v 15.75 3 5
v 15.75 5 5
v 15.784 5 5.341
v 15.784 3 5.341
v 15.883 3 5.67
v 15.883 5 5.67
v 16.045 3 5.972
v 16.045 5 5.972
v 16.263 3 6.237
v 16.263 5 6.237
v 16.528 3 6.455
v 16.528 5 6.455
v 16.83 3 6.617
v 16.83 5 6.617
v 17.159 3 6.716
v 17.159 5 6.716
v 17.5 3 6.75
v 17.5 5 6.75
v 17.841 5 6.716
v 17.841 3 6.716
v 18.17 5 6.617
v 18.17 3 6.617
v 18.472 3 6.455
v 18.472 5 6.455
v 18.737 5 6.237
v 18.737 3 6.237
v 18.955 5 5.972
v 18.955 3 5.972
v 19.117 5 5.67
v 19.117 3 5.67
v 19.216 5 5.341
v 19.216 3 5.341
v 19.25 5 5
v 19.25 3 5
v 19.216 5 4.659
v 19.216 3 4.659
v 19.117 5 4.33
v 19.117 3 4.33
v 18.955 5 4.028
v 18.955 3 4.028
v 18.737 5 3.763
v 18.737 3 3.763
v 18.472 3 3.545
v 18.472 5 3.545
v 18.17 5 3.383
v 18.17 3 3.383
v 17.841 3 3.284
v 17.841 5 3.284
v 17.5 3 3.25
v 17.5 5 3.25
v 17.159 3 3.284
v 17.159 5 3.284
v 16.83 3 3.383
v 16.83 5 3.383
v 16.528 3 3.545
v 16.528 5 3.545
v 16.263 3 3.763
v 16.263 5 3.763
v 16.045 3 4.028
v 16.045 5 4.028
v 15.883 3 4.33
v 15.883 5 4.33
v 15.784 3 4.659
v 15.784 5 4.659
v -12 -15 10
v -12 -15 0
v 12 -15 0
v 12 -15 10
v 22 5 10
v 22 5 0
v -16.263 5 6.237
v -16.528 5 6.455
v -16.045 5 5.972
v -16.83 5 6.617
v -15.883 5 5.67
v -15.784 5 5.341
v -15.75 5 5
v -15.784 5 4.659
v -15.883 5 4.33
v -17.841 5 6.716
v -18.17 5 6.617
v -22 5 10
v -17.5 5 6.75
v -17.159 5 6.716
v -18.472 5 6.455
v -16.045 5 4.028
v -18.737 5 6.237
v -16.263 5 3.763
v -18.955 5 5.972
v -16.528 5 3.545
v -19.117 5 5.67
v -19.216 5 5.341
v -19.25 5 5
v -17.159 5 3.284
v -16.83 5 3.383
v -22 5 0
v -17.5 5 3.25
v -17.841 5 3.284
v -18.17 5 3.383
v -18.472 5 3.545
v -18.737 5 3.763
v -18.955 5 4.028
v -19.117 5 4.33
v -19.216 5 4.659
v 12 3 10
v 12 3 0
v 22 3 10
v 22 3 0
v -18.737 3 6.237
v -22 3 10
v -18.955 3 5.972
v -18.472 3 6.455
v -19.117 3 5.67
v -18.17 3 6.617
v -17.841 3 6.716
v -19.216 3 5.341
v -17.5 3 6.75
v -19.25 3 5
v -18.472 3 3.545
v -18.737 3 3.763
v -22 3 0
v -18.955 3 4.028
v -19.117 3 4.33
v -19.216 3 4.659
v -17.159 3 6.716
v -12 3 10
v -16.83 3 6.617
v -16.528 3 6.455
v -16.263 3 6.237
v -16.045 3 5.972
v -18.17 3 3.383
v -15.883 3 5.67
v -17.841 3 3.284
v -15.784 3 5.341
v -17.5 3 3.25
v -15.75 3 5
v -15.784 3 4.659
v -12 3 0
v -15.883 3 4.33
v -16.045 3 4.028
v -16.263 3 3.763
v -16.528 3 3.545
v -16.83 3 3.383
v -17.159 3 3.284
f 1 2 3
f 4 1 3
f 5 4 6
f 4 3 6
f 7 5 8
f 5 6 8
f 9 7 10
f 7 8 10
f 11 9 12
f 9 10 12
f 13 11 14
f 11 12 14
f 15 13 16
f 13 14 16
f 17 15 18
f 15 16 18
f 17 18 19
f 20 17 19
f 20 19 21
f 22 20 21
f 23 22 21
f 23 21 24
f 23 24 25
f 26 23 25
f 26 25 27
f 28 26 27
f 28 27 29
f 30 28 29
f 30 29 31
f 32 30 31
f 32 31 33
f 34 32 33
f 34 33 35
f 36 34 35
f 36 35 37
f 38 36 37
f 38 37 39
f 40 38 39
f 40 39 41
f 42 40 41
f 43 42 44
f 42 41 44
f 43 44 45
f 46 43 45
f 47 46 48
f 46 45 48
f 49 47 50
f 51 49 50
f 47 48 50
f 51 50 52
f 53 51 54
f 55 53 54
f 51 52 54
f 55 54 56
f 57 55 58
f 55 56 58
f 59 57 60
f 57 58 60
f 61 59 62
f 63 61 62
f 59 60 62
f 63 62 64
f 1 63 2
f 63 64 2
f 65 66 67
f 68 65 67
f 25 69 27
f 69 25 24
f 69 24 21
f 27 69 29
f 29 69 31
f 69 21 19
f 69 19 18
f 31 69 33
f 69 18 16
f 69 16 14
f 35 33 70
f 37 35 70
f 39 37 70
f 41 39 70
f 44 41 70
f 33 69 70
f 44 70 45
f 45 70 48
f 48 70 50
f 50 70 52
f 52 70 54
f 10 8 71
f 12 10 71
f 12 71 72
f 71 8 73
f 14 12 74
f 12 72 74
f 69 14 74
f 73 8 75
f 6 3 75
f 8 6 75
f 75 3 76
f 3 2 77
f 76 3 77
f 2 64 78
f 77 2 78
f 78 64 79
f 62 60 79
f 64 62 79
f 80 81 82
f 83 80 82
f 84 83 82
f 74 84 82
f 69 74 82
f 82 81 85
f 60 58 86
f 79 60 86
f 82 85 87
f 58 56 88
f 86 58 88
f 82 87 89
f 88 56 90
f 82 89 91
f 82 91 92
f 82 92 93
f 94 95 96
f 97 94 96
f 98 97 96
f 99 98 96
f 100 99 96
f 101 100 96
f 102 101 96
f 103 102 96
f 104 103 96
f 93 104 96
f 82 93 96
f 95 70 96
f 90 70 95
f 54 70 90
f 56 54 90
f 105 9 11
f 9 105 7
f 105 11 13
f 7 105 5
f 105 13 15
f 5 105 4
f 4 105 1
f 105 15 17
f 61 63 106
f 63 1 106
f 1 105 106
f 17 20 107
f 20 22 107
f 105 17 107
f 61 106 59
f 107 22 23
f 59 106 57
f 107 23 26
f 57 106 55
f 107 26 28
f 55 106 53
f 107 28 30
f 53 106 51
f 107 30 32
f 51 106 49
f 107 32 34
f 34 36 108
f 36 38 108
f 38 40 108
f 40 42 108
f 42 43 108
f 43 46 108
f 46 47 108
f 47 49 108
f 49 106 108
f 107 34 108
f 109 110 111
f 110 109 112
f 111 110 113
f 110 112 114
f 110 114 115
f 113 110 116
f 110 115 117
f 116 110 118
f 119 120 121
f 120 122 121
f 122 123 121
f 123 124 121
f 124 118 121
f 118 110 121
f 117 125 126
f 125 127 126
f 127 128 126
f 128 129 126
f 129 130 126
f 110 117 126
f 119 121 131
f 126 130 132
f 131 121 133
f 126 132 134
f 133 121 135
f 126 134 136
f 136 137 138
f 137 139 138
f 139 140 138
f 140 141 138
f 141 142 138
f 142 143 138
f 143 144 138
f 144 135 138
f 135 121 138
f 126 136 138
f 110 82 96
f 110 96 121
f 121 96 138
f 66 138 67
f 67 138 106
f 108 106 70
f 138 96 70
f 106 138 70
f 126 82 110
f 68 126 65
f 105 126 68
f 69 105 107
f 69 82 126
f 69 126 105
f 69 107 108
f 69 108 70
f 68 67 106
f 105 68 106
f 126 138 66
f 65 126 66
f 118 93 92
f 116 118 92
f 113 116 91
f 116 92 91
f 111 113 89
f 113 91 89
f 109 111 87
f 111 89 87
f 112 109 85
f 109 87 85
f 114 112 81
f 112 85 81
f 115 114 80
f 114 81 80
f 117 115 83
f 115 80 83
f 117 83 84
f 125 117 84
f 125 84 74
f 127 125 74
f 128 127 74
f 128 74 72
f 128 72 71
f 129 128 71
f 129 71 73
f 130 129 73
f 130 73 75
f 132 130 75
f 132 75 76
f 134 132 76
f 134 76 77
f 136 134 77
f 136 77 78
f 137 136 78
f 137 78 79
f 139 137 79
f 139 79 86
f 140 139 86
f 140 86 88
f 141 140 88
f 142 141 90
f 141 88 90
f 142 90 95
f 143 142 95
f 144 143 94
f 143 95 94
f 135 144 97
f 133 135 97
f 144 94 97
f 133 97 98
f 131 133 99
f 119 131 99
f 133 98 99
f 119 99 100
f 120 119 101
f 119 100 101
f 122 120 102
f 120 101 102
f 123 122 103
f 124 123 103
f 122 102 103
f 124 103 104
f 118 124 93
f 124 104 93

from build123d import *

# Parameters (mm, degrees)
RESSALTO_EXTRUS_O1_DEPTH = 10
ESBO_O2_R                = 1.75
CORTE_EXTRUS_O1_DEPTH    = 10


with BuildPart() as part:
    # Esboço1 → Ressalto-extrusão1 (new body)
    with BuildSketch(Plane.XY):
        Polygon((-12, 5), (-22, 5), (-22, 3), (-12, 3), (-12, -15), (12, -15), (12, 3), (22, 3), (22, 5), (12, 5), align=None)
    extrude(amount=RESSALTO_EXTRUS_O1_DEPTH)

    # Esboço2 → Corte-extrusão1 (cut)
    with BuildSketch(Plane(origin=(0, 5, 0), x_dir=(1, 0, 0), z_dir=(0, 1, 0))):
        with Locations(Location((-17.5, -5, 0), (0, 0, 180))):
            Circle(ESBO_O2_R)
        with Locations(Location((17.5, -5, 0), (0, 0, 180))):
            Circle(ESBO_O2_R)
    extrude(amount=-CORTE_EXTRUS_O1_DEPTH, mode=Mode.SUBTRACT)


solid = part.part
